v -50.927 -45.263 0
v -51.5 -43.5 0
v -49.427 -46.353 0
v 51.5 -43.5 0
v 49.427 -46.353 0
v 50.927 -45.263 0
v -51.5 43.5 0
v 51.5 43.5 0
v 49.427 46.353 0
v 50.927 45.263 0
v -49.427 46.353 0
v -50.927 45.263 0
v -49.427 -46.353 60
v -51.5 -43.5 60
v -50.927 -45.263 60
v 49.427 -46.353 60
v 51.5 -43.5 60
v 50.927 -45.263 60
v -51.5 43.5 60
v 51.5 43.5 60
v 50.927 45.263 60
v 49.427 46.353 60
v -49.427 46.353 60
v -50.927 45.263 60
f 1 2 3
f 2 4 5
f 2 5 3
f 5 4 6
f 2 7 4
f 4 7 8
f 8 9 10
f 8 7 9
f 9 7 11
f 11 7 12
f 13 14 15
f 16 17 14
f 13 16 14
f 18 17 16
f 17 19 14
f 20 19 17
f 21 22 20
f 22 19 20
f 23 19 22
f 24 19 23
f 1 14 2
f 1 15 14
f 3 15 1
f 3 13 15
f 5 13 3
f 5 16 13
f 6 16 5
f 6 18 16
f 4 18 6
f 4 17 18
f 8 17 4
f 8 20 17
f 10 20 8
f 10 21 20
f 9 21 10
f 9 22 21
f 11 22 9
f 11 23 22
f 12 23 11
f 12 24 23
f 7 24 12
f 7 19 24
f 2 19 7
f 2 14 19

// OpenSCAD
module roundedRect(size, radius)
{
x = size[0];
y = size[1];
z = size[2];

linear_extrude(height=z)
hull()
{
    // place 4 circles in the corners, with the given radius
    translate([(-x/2)+(radius/2), (-y/2)+(radius/2), 0])
    circle(r=radius);

    translate([(x/2)-(radius/2), (-y/2)+(radius/2), 0])
    circle(r=radius);

    translate([(-x/2)+(radius/2), (y/2)-(radius/2), 0])
    circle(r=radius);

    translate([(x/2)-(radius/2), (y/2)-(radius/2), 0])
    circle(r=radius);
}
}

// example
roundedRect([100, 90, 60], 3);
